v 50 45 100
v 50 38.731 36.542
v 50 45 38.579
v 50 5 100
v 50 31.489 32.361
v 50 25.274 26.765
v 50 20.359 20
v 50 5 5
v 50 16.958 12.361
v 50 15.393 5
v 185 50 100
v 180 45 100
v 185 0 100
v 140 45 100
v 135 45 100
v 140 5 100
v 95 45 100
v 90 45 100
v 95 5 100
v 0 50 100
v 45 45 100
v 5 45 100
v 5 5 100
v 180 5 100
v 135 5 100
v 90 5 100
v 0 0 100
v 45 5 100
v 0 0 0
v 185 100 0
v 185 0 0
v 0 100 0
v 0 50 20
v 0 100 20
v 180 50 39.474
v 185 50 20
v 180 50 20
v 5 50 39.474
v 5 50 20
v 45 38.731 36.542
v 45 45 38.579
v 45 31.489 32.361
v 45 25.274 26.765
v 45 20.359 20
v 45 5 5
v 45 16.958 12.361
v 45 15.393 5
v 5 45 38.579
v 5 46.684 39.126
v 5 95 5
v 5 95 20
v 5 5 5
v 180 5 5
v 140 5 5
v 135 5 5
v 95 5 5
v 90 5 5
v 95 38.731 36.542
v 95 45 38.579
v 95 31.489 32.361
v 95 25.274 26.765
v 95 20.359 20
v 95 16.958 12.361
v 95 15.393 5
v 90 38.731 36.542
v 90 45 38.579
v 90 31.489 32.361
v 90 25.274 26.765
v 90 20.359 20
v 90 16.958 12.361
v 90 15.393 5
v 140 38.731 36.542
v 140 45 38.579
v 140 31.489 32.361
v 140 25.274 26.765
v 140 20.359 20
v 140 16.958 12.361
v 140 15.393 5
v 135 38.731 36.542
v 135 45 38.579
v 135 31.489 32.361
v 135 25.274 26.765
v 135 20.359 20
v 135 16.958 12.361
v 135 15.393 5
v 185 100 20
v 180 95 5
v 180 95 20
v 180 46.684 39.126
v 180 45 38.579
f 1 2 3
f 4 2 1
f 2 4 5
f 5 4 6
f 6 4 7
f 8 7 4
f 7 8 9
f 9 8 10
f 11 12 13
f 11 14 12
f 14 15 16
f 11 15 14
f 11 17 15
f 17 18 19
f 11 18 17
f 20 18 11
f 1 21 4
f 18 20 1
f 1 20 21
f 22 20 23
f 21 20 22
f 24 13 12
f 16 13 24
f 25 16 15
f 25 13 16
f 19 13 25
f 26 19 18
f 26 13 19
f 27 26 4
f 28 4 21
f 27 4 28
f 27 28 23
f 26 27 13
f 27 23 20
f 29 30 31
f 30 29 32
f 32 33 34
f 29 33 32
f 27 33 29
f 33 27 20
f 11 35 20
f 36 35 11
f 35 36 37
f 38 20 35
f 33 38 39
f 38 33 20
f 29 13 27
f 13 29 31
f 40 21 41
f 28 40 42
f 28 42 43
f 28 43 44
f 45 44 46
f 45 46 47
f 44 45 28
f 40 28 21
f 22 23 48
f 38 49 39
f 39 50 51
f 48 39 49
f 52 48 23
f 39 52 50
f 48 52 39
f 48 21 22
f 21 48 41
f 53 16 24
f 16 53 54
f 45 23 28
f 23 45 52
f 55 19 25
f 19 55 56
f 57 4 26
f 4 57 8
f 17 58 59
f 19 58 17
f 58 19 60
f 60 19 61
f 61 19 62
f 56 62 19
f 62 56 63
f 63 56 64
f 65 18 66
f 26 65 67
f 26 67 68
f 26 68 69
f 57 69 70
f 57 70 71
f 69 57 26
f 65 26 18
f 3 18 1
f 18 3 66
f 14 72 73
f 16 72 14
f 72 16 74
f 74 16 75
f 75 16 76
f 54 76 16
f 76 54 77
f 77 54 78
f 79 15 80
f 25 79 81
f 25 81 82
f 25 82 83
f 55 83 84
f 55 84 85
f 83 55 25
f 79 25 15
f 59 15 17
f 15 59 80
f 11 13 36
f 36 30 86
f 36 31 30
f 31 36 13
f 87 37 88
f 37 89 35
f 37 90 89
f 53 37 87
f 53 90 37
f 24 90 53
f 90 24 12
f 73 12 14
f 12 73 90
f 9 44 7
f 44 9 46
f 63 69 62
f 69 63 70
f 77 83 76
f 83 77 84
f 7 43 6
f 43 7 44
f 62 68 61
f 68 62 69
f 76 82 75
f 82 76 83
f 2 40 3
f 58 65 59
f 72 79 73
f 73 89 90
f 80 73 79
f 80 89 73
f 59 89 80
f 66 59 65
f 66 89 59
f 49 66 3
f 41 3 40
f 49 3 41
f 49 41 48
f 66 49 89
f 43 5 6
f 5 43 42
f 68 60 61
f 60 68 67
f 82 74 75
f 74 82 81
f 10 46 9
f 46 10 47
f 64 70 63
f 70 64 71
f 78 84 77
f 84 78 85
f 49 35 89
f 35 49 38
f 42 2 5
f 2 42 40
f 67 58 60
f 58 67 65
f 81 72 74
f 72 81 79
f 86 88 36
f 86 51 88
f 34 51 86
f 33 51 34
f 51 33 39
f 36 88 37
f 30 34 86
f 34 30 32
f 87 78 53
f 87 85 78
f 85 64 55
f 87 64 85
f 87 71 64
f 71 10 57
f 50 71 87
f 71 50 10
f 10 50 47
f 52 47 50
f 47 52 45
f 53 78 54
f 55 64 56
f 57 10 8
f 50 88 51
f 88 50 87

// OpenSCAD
difference() {
  union() {
    difference() {
      cube([50, 50, 100]);
      translate([5, 5, -1]) cube([40, 40, 102]);
    }
    translate([45, 0, 0]) difference() {
      cube([50, 50, 100]);
      translate([5, 5, -1]) cube([40, 40, 102]);
    }
    translate([90, 0, 0]) difference() {
      cube([50, 50, 100]);
      translate([5, 5, -1]) cube([40, 40, 102]);
    }
    translate([135, 0, 0]) difference() {
      cube([50, 50, 100]);
      translate([5, 5, -1]) cube([40, 40, 102]);
    }
  }
  rotate([0, 90, 0]) translate([0, 55, 5]) cylinder(175, 40, 40);
}
difference() {
  cube([185, 100, 20]);
  translate([5, 5, 5]) cube([175, 90, 16]);
}
